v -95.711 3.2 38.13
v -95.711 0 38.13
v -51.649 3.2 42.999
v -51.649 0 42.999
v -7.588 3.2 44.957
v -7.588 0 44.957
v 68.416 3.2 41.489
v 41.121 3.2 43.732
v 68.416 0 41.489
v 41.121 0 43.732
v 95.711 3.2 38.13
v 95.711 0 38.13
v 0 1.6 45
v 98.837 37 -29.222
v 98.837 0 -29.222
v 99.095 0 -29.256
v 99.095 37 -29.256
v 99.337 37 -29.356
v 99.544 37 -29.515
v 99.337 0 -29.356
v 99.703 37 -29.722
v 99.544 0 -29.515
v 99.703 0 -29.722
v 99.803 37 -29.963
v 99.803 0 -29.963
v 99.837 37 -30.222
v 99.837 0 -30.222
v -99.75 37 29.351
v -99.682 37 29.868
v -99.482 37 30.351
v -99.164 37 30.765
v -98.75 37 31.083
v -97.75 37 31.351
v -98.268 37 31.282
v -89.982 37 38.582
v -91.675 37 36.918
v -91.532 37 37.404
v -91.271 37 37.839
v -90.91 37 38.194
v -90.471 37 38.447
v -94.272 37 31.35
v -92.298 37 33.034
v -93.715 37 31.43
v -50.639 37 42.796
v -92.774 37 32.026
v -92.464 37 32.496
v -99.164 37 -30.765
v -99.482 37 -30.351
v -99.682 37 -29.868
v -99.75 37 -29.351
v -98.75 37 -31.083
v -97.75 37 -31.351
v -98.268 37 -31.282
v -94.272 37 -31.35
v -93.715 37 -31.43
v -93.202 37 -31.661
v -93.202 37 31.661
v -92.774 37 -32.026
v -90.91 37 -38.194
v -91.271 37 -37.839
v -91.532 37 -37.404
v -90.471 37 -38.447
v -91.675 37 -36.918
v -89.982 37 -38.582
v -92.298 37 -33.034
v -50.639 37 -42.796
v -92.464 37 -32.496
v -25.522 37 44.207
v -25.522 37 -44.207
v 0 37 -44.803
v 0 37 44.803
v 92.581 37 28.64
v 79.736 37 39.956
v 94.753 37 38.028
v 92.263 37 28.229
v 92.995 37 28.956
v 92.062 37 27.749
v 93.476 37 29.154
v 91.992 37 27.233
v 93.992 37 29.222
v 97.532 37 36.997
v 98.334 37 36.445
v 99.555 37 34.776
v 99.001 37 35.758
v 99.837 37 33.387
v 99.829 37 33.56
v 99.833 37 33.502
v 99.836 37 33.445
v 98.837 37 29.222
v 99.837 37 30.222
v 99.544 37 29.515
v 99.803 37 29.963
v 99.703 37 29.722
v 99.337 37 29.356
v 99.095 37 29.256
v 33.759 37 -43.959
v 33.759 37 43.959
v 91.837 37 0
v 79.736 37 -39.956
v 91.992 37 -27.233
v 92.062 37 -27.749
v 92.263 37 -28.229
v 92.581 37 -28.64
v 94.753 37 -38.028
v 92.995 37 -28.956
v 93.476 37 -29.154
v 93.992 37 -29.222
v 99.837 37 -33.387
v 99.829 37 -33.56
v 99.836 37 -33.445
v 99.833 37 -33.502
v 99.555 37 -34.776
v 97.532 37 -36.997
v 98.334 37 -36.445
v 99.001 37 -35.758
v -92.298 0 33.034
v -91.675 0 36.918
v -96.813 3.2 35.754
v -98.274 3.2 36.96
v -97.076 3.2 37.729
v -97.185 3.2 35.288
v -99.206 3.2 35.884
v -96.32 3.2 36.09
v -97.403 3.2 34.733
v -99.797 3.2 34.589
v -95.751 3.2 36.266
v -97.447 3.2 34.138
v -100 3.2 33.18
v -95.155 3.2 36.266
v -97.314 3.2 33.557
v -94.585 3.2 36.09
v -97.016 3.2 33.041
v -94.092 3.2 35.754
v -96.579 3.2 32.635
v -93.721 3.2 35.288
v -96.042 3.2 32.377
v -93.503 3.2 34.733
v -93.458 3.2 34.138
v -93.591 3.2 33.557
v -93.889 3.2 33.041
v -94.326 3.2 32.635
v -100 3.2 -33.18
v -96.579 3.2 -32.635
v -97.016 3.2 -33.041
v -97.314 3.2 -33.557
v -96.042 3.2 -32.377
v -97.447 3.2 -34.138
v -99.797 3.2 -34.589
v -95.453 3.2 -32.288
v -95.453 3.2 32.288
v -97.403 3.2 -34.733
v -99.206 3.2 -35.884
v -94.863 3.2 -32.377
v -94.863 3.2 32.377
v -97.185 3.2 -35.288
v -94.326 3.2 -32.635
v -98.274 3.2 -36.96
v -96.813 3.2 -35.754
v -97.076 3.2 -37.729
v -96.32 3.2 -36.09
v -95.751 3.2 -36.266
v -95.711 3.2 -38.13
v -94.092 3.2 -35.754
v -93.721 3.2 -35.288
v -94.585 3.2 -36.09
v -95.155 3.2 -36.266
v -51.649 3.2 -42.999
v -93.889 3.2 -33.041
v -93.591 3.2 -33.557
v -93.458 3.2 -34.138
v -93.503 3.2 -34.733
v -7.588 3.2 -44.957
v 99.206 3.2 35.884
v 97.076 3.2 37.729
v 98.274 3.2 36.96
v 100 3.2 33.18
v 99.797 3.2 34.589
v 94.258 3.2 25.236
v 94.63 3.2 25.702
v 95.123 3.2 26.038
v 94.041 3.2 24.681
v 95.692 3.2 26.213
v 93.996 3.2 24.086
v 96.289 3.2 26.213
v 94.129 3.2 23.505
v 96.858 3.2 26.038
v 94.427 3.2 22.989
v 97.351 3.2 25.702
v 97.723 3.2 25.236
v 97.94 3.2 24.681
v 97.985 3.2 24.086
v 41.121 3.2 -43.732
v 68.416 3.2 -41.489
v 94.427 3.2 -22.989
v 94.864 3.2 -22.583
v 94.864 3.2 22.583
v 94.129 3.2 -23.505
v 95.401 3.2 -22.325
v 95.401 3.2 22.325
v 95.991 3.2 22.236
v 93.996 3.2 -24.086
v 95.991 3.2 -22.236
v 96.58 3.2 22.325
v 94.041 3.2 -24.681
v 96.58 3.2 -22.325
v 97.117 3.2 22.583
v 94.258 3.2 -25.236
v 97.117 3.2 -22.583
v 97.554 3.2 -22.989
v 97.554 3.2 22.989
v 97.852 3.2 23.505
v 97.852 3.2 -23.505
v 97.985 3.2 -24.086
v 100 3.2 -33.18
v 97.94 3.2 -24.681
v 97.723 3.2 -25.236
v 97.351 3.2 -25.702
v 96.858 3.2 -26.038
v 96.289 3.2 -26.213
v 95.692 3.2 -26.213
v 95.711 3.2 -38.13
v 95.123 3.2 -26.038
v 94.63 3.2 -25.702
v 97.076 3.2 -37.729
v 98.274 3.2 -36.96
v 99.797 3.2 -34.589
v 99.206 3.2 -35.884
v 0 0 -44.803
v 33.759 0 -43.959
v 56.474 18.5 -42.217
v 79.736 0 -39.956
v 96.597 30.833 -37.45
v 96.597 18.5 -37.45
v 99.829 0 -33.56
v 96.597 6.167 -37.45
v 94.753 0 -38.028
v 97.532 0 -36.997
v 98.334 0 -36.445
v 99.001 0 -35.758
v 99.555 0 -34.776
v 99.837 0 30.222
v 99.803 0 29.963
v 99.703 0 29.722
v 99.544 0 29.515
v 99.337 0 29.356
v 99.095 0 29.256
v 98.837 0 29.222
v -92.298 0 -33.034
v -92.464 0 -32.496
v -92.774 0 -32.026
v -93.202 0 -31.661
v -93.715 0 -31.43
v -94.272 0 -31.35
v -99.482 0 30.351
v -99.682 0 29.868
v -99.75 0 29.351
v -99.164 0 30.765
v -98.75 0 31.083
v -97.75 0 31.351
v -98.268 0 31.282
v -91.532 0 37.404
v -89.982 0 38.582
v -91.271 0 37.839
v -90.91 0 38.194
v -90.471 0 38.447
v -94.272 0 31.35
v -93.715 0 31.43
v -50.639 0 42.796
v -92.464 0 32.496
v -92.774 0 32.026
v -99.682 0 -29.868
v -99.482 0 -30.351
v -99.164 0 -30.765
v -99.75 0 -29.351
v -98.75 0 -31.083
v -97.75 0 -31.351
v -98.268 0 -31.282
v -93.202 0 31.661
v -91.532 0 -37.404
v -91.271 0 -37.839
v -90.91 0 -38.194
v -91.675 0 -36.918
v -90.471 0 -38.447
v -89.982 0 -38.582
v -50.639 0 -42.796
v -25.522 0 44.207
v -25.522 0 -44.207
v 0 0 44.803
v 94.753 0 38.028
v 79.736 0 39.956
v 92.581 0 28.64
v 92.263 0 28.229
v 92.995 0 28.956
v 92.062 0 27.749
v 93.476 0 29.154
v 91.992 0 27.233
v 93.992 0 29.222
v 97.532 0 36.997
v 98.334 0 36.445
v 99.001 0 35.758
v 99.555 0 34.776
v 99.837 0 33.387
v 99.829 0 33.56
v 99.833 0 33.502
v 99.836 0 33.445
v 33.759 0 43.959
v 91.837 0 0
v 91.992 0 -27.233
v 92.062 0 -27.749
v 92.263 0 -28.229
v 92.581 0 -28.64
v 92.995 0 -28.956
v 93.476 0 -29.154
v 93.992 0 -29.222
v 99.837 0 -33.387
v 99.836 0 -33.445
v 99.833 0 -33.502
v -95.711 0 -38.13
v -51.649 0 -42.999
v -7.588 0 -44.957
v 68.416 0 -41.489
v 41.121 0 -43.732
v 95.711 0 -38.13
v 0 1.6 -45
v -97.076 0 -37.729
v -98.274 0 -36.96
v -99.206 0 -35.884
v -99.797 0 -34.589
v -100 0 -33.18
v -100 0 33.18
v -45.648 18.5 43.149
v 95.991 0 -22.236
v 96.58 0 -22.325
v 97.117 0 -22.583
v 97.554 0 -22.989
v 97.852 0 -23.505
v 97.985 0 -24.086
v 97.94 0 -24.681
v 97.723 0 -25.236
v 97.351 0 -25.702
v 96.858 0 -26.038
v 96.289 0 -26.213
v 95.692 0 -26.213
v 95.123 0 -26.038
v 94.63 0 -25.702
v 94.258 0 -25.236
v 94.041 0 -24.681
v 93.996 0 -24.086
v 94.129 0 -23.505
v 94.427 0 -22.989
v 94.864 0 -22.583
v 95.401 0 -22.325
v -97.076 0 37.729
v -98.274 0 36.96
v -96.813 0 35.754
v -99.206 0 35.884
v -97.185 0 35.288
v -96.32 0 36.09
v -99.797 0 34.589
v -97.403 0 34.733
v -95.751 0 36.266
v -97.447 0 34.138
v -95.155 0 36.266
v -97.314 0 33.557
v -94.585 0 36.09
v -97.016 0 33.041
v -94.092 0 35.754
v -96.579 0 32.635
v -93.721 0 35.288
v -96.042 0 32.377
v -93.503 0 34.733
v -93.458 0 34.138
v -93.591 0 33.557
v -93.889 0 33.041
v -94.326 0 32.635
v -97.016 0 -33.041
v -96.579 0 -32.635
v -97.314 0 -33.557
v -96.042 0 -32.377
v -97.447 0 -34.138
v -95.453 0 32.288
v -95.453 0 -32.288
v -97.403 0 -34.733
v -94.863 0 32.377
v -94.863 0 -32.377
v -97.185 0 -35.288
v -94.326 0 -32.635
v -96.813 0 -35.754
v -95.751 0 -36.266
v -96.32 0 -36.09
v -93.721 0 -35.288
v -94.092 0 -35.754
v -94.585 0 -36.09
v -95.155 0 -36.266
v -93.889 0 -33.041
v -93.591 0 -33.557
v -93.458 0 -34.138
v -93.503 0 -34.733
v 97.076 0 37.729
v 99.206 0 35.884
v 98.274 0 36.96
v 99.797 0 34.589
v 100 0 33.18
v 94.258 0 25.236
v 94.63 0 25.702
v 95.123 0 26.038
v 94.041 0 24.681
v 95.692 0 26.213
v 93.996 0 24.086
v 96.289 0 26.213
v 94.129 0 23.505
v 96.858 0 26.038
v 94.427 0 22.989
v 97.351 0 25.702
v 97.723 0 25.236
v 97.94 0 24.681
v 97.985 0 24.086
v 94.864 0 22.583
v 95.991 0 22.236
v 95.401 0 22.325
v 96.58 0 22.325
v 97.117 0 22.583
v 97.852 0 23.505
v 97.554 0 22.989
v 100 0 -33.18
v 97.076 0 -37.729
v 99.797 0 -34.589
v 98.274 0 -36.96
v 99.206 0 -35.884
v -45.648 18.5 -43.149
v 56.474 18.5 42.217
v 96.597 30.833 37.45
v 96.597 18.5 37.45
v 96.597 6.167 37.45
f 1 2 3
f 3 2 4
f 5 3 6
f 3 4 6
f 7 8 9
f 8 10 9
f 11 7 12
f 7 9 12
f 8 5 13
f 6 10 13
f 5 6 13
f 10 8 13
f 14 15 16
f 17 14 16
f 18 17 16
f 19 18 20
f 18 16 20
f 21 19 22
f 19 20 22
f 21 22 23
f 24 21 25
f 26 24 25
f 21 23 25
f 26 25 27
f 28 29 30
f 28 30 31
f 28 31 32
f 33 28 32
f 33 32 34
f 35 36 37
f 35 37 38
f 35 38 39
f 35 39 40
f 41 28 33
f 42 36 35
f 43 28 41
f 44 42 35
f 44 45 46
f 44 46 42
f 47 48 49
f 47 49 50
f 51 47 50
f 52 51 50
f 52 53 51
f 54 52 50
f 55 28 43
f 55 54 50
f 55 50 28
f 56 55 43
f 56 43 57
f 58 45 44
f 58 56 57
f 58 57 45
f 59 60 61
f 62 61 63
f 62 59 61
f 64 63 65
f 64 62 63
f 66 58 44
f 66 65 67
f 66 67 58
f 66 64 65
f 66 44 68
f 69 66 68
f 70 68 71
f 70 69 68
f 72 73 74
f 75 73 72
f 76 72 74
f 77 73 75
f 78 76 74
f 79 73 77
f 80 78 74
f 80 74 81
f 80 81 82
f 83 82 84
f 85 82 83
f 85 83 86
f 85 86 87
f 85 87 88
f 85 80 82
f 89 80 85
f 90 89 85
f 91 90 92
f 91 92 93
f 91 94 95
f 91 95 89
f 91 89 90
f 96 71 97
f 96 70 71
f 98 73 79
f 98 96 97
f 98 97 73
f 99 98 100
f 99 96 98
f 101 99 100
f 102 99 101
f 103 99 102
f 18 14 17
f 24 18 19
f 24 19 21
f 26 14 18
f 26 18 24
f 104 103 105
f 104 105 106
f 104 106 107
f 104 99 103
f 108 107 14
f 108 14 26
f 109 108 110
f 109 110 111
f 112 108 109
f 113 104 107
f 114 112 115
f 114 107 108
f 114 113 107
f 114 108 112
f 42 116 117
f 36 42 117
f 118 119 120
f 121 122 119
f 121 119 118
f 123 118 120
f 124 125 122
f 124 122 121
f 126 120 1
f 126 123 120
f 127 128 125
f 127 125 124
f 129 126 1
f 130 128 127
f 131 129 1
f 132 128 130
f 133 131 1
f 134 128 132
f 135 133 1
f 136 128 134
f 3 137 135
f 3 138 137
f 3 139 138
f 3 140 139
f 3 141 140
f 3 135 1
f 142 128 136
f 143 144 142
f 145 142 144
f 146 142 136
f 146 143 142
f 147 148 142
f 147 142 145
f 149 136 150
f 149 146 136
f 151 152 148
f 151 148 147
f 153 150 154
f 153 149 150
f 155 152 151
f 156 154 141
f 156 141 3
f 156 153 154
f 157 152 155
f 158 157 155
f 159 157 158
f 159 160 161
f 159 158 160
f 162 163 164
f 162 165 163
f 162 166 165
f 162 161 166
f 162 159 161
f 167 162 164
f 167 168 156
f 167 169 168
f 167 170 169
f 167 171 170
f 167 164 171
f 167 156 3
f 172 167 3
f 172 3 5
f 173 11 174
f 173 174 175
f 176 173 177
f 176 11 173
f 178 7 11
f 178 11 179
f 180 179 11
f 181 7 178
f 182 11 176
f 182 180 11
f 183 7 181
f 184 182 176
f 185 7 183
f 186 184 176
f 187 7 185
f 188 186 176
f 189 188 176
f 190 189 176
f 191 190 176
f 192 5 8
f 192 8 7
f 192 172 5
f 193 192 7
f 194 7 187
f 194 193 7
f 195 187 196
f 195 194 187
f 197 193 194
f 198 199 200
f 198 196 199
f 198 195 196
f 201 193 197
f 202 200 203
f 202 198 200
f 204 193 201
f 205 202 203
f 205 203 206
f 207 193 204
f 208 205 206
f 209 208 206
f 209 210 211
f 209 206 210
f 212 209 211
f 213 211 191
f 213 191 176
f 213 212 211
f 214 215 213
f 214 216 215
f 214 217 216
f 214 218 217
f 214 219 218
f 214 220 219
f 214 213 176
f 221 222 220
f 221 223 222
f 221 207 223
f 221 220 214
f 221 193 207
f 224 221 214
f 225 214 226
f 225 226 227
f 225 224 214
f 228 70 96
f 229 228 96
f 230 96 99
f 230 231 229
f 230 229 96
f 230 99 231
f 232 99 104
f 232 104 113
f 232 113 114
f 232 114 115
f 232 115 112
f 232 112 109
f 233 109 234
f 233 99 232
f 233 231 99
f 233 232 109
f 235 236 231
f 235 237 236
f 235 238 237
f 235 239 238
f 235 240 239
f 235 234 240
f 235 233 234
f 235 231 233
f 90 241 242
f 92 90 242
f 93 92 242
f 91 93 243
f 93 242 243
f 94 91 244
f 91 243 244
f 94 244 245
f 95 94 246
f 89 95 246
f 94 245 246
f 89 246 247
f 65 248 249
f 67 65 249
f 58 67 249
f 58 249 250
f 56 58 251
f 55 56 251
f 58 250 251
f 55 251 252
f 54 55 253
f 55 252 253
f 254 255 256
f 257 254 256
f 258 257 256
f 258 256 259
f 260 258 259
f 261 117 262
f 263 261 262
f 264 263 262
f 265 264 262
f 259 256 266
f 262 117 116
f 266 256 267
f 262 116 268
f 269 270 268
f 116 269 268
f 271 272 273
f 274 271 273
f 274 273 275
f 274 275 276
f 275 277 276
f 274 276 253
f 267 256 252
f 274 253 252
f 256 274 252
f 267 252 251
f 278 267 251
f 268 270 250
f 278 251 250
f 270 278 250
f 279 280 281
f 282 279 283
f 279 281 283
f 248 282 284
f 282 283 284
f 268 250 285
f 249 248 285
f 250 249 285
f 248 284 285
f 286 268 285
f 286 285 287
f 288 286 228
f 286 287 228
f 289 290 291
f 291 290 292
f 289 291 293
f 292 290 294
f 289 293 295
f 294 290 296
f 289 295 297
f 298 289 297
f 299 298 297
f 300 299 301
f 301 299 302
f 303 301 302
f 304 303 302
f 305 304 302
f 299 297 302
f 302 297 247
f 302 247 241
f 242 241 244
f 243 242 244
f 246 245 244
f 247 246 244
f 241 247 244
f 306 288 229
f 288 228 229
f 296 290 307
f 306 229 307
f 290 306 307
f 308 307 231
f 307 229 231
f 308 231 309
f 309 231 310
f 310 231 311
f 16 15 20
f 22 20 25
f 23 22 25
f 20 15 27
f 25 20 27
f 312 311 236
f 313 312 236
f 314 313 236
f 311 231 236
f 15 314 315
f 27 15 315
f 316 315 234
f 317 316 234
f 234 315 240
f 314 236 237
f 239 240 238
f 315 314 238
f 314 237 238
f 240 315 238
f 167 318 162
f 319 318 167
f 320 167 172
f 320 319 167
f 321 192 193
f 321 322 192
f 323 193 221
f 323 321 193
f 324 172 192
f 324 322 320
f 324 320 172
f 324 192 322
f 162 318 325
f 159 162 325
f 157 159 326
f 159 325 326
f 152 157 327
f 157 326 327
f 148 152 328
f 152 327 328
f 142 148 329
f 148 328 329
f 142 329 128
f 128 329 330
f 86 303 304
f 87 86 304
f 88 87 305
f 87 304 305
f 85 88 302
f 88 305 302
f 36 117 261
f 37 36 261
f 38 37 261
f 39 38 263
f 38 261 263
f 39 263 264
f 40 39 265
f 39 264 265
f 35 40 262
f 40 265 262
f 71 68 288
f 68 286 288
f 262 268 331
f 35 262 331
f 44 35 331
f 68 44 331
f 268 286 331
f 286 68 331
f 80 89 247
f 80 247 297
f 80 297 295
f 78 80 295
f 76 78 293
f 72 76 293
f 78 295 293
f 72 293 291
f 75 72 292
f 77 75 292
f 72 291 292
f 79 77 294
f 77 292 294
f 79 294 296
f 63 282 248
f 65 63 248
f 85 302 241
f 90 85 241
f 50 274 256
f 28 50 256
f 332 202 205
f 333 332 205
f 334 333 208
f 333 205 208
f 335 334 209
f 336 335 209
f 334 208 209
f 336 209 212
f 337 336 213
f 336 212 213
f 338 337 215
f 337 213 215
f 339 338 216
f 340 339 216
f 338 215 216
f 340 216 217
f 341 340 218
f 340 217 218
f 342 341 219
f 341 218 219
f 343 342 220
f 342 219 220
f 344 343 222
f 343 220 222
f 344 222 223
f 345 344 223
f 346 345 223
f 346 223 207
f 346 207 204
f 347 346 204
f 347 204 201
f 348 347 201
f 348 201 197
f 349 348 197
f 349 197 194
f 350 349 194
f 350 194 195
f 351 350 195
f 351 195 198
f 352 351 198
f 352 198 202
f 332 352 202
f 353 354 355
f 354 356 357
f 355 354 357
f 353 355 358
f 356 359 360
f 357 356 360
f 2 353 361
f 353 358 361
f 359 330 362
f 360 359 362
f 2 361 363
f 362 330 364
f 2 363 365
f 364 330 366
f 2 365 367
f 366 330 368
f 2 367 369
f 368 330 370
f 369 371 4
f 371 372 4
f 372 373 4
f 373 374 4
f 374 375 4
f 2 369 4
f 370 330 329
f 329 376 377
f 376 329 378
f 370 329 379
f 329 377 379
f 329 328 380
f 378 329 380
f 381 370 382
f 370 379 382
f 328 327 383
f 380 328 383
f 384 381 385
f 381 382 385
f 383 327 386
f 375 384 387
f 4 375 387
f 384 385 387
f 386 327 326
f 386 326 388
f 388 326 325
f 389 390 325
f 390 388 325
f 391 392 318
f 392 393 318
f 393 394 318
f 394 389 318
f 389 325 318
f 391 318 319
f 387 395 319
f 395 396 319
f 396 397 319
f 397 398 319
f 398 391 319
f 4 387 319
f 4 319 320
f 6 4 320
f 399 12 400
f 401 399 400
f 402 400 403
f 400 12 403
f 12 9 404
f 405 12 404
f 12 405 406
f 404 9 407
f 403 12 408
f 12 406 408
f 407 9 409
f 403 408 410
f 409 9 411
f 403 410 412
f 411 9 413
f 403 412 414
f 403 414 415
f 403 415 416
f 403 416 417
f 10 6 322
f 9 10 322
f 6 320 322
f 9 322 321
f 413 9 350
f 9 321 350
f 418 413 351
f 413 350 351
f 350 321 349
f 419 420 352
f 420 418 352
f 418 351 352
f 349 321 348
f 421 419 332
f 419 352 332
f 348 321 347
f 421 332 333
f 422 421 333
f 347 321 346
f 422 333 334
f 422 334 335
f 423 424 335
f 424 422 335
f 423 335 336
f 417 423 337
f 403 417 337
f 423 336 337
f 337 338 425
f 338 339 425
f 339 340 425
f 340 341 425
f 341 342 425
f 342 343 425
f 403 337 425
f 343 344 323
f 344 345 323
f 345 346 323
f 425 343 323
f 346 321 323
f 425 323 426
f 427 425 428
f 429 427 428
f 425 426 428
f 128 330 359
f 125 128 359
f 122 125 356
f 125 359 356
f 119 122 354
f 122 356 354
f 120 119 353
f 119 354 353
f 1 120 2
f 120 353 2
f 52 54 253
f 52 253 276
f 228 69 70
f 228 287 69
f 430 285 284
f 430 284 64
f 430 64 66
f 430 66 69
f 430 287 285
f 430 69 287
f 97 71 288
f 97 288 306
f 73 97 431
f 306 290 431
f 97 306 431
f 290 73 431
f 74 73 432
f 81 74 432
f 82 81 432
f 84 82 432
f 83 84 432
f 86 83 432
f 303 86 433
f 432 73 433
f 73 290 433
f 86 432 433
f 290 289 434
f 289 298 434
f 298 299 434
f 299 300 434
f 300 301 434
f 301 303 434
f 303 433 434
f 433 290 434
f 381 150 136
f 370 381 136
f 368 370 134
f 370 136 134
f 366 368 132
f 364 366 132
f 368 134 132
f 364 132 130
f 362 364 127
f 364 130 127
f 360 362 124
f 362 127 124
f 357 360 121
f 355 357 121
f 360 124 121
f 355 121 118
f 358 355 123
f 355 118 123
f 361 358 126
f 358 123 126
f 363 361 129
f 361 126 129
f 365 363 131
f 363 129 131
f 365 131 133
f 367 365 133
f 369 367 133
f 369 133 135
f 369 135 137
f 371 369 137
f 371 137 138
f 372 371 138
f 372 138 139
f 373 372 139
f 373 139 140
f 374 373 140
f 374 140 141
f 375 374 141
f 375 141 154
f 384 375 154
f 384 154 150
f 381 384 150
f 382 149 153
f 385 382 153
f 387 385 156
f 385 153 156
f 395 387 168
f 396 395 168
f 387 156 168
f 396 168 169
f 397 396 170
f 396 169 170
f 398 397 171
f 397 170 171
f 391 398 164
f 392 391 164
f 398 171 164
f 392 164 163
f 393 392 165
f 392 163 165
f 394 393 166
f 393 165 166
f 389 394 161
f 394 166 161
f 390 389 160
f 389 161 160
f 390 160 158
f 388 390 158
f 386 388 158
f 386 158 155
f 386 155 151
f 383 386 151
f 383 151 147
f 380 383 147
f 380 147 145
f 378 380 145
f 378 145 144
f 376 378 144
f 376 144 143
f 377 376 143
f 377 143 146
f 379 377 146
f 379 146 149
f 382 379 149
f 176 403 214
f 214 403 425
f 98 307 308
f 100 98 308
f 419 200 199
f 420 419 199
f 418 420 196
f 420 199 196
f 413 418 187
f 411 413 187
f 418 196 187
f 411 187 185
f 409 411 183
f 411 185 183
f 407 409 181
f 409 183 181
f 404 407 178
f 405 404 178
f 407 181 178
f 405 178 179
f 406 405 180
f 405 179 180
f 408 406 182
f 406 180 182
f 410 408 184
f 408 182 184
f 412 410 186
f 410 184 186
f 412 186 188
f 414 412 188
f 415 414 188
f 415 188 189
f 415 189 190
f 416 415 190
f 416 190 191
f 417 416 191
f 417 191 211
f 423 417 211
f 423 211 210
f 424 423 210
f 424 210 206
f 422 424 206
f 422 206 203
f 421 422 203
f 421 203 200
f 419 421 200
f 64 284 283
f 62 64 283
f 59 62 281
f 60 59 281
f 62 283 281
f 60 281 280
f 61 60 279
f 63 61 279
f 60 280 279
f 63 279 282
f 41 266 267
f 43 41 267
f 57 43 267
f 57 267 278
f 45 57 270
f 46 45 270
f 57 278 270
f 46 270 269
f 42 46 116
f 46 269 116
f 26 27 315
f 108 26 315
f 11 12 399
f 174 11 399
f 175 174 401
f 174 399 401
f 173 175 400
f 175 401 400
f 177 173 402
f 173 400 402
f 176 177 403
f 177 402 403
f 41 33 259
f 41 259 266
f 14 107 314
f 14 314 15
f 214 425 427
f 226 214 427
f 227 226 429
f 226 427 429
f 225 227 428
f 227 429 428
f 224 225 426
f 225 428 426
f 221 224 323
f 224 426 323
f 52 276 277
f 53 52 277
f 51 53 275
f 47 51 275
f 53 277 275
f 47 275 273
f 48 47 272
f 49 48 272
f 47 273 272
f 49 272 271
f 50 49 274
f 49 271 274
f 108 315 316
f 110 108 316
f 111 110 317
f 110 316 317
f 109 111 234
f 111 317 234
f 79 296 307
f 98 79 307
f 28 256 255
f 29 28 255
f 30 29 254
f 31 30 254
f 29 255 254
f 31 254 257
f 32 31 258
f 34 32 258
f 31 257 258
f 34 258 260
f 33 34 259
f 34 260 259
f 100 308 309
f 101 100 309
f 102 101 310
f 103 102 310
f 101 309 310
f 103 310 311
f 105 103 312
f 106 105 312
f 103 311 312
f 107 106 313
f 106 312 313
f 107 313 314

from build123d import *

# Parameters (mm, degrees)
BOSS_EXTRUDE1_DEPTH = 3.2
BOSS_EXTRUDE2_DEPTH = 37
SKETCH5_R           = 2
CUT_EXTRUDE1_DEPTH  = 115.749466386


with BuildPart() as part:
    # Sketch1 → Boss-Extrude1 (new body)
    with BuildSketch(Plane(origin=(0, 0, 0), x_dir=(1, 0, 0), z_dir=(0, 1, 0))):
        with BuildLine():
            Line((-100, 33.180363606), (-100, -33.180363606))
            ThreePointArc((-100, -33.180363606), (-98.778407027, -36.45506059), (-95.710543866, -38.129618845))
            add(Edge.make_bspline(
                [(-95.710543866, -38.129618845), (-63.807029244, -42.709872948), (0, -47.290127052), (63.807029244, -42.709872948), (95.710543866, -38.129618845)],
                knots=[0.021447281, 0.021447281, 0.021447281, 0.021447281, 0.5, 0.978552719, 0.978552719, 0.978552719, 0.978552719], degree=3))
            ThreePointArc((95.710543866, -38.129618845), (98.778407027, -36.45506059), (100, -33.180363606))
            Line((100, -33.180363606), (100, 33.180363606))
            ThreePointArc((100, 33.180363606), (98.778407027, 36.45506059), (95.710543866, 38.129618845))
            add(Edge.make_bspline(
                [(-95.710543866, 38.129618845), (-63.807029244, 42.709872948), (0, 47.290127052), (63.807029244, 42.709872948), (95.710543866, 38.129618845)],
                knots=[0.021447281, 0.021447281, 0.021447281, 0.021447281, 0.5, 0.978552719, 0.978552719, 0.978552719, 0.978552719], degree=3))
            ThreePointArc((-95.710543866, 38.129618845), (-98.778407027, 36.45506059), (-100, 33.180363606))
        make_face()
    extrude(amount=BOSS_EXTRUDE1_DEPTH)

    # Sketch5 → Cut-Extrude1 (cut, through all)
    with BuildSketch(Plane(origin=(0, 3.2, 0), x_dir=(1, 0, 0), z_dir=(0, 1, 0))):
        with Locations(Location((-95.452729766, 34.287861844, 0), (0, 0, 270))):
            Circle(SKETCH5_R)
        with Locations(Location((-95.452729766, -34.287861844, 0), (0, 0, 90))):
            Circle(SKETCH5_R)
        with Locations(Location((95.99050817, 24.235706528, 0), (0, 0, 270))):
            Circle(SKETCH5_R)
        with Locations(Location((95.99050817, -24.235706528, 0), (0, 0, 90))):
            Circle(SKETCH5_R)
    extrude(amount=-CUT_EXTRUDE1_DEPTH, mode=Mode.SUBTRACT)


with BuildPart() as body_2:
    # Sketch4 → Boss-Extrude2 (new body)
    with BuildSketch(Plane(origin=(0, 0, 0), x_dir=(1, 0, 0), z_dir=(0, 1, 0))):
        with BuildLine():
            Line((99.836632729, -33.387386203), (99.836632729, -30.42884553))
            Line((99.836632729, -30.42884553), (99.836632729, -30.221958284))
            ThreePointArc((99.836632729, -30.221958284), (99.54373951, -29.514851503), (98.836632729, -29.221958284))
            Line((98.836632729, -29.221958284), (93.991628276, -29.221958284))
            ThreePointArc((93.991628276, -29.221958284), (92.581445654, -28.64019133), (91.991660681, -27.233343257))
            Line((91.991660681, -27.233343257), (91.836632729, 0))
            Line((91.836632729, 0), (91.991660681, 27.233343257))
            ThreePointArc((91.991660681, 27.233343257), (92.581445654, 28.64019133), (93.991628276, 29.221958284))
            Line((93.991628276, 29.221958284), (98.836632729, 29.221958284))
            ThreePointArc((98.836632729, 29.221958284), (99.54373951, 29.514851503), (99.836632729, 30.221958284))
            Line((99.836632729, 30.221958284), (99.836632729, 30.42884553))
            Line((99.836632729, 30.42884553), (99.836632729, 33.387386203))
            ThreePointArc((99.836632729, 33.387386203), (99.834773836, 33.473595926), (99.829200612, 33.559645394))
            add(Edge.make_bspline(
                [(0, 44.802805821), (13.836630515, 44.914508245), (34.369021475, 44.256257564), (64.995120664, 41.430112577), (81.200098897, 39.945879291), (95.364485464, 38.069678587), (98.681175098, 36.553953762), (99.721833489, 34.801589465), (99.829200612, 33.559645394)],
                knots=[0, 0, 0, 0, 0.456142612, 0.549379817, 0.88981736, 0.935787829, 0.966529808, 0.99916057, 0.99916057, 0.99916057, 0.99916057], degree=3))
            add(Edge.make_bspline(
                [(-89.982219157, 38.581536757), (-75.42343033, 40.657136076), (-45.867040318, 43.63406662), (-15.434719566, 44.669101832), (0, 44.802805821)],
                knots=[0.01182412, 0.01182412, 0.01182412, 0.01182412, 0.50591206, 1, 1, 1, 1], degree=3))
            ThreePointArc((-89.982219157, 38.581536757), (-91.101816056, 38.028001634), (-91.674716885, 36.918189492))
            Line((-91.674716885, 36.918189492), (-92.297533234, 33.033797351))
            ThreePointArc((-92.297533234, 33.033797351), (-92.974890422, 31.828357905), (-94.272380865, 31.350429489))
            Line((-94.272380865, 31.350429489), (-97.749929341, 31.350552349))
            ThreePointArc((-97.749929341, 31.350552349), (-99.16418858, 30.764790895), (-99.75, 29.350552351))
            Line((-99.75, 29.350552351), (-99.75, -29.350552351))
            ThreePointArc((-99.75, -29.350552351), (-99.16418858, -30.764790895), (-97.749929341, -31.350552349))
            Line((-97.749929341, -31.350552349), (-94.272380865, -31.350429489))
            ThreePointArc((-94.272380865, -31.350429489), (-92.974890422, -31.828357905), (-92.297533234, -33.033797351))
            Line((-92.297533234, -33.033797351), (-91.674716885, -36.918189492))
            ThreePointArc((-91.674716885, -36.918189492), (-91.101816056, -38.028001634), (-89.982219157, -38.581536757))
            add(Edge.make_bspline(
                [(-89.982219157, -38.581536757), (-75.42343033, -40.657136076), (-45.867040318, -43.63406662), (-15.434719566, -44.669101832), (0, -44.802805821)],
                knots=[0.01182412, 0.01182412, 0.01182412, 0.01182412, 0.50591206, 1, 1, 1, 1], degree=3))
            add(Edge.make_bspline(
                [(0, -44.802805821), (13.836630515, -44.914508245), (34.369021475, -44.256257564), (64.995120664, -41.430112577), (81.200098897, -39.945879291), (95.364485464, -38.069678587), (98.681175098, -36.553953762), (99.721833489, -34.801589465), (99.829200612, -33.559645394)],
                knots=[0, 0, 0, 0, 0.456142612, 0.549379817, 0.88981736, 0.935787829, 0.966529808, 0.99916057, 0.99916057, 0.99916057, 0.99916057], degree=3))
            ThreePointArc((99.829200612, -33.559645394), (99.834773836, -33.473595926), (99.836632729, -33.387386203))
        make_face()
    extrude(amount=BOSS_EXTRUDE2_DEPTH)


solid = Compound([part.part, body_2.part])
